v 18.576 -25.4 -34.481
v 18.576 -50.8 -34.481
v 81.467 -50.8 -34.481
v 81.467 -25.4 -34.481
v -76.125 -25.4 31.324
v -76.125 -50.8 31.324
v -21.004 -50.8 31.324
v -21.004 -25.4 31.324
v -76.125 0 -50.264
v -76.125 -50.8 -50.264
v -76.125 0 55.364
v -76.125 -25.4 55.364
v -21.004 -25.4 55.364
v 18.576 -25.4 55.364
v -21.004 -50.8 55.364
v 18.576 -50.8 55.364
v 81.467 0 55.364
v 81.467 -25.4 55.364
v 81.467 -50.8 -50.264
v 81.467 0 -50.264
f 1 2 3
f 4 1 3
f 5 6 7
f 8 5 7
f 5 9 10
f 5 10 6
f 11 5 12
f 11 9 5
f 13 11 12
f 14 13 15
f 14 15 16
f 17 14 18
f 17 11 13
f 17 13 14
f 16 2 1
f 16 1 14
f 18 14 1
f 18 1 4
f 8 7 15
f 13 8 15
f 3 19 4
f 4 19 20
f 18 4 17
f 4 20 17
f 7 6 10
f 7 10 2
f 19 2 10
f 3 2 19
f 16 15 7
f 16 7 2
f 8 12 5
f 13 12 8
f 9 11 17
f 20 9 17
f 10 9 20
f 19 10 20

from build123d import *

# Parameters (mm, degrees)
F0_W     = 157.5917825103
F0_H     = 105.6277751923
F1_DEPTH = 50.8
F2_W     = 55.120697245
F2_H     = 24.0394249558
F3_DEPTH = 25.4
F2_W_2   = 62.8910250962
F2_H_2   = 89.8443162441
F4_DEPTH = 25.4


with BuildPart() as f1:
    # F0 (on Front) → F1 (new body)
    with BuildSketch(Plane.XZ):
        with Locations((2.6710517704, 2.549637109)):
            Rectangle(F0_W, F0_H)
    extrude(amount=F1_DEPTH)

    # F2 (on face) → F3 (cut)
    with BuildSketch(Plane.XZ.offset(50.8)):
        with Locations((-48.5644908622, 43.3438122272)):
            Rectangle(F2_W, F2_H)
    extrude(amount=-F3_DEPTH, mode=Mode.SUBTRACT)

    # F2 (on face) → F4 (cut)
    with BuildSketch(Plane.XZ.offset(50.8)):
        with Locations((50.0214304775, 10.4413665831)):
            Rectangle(F2_W_2, F2_H_2)
    extrude(amount=-F4_DEPTH, mode=Mode.SUBTRACT)


solid = f1.part
